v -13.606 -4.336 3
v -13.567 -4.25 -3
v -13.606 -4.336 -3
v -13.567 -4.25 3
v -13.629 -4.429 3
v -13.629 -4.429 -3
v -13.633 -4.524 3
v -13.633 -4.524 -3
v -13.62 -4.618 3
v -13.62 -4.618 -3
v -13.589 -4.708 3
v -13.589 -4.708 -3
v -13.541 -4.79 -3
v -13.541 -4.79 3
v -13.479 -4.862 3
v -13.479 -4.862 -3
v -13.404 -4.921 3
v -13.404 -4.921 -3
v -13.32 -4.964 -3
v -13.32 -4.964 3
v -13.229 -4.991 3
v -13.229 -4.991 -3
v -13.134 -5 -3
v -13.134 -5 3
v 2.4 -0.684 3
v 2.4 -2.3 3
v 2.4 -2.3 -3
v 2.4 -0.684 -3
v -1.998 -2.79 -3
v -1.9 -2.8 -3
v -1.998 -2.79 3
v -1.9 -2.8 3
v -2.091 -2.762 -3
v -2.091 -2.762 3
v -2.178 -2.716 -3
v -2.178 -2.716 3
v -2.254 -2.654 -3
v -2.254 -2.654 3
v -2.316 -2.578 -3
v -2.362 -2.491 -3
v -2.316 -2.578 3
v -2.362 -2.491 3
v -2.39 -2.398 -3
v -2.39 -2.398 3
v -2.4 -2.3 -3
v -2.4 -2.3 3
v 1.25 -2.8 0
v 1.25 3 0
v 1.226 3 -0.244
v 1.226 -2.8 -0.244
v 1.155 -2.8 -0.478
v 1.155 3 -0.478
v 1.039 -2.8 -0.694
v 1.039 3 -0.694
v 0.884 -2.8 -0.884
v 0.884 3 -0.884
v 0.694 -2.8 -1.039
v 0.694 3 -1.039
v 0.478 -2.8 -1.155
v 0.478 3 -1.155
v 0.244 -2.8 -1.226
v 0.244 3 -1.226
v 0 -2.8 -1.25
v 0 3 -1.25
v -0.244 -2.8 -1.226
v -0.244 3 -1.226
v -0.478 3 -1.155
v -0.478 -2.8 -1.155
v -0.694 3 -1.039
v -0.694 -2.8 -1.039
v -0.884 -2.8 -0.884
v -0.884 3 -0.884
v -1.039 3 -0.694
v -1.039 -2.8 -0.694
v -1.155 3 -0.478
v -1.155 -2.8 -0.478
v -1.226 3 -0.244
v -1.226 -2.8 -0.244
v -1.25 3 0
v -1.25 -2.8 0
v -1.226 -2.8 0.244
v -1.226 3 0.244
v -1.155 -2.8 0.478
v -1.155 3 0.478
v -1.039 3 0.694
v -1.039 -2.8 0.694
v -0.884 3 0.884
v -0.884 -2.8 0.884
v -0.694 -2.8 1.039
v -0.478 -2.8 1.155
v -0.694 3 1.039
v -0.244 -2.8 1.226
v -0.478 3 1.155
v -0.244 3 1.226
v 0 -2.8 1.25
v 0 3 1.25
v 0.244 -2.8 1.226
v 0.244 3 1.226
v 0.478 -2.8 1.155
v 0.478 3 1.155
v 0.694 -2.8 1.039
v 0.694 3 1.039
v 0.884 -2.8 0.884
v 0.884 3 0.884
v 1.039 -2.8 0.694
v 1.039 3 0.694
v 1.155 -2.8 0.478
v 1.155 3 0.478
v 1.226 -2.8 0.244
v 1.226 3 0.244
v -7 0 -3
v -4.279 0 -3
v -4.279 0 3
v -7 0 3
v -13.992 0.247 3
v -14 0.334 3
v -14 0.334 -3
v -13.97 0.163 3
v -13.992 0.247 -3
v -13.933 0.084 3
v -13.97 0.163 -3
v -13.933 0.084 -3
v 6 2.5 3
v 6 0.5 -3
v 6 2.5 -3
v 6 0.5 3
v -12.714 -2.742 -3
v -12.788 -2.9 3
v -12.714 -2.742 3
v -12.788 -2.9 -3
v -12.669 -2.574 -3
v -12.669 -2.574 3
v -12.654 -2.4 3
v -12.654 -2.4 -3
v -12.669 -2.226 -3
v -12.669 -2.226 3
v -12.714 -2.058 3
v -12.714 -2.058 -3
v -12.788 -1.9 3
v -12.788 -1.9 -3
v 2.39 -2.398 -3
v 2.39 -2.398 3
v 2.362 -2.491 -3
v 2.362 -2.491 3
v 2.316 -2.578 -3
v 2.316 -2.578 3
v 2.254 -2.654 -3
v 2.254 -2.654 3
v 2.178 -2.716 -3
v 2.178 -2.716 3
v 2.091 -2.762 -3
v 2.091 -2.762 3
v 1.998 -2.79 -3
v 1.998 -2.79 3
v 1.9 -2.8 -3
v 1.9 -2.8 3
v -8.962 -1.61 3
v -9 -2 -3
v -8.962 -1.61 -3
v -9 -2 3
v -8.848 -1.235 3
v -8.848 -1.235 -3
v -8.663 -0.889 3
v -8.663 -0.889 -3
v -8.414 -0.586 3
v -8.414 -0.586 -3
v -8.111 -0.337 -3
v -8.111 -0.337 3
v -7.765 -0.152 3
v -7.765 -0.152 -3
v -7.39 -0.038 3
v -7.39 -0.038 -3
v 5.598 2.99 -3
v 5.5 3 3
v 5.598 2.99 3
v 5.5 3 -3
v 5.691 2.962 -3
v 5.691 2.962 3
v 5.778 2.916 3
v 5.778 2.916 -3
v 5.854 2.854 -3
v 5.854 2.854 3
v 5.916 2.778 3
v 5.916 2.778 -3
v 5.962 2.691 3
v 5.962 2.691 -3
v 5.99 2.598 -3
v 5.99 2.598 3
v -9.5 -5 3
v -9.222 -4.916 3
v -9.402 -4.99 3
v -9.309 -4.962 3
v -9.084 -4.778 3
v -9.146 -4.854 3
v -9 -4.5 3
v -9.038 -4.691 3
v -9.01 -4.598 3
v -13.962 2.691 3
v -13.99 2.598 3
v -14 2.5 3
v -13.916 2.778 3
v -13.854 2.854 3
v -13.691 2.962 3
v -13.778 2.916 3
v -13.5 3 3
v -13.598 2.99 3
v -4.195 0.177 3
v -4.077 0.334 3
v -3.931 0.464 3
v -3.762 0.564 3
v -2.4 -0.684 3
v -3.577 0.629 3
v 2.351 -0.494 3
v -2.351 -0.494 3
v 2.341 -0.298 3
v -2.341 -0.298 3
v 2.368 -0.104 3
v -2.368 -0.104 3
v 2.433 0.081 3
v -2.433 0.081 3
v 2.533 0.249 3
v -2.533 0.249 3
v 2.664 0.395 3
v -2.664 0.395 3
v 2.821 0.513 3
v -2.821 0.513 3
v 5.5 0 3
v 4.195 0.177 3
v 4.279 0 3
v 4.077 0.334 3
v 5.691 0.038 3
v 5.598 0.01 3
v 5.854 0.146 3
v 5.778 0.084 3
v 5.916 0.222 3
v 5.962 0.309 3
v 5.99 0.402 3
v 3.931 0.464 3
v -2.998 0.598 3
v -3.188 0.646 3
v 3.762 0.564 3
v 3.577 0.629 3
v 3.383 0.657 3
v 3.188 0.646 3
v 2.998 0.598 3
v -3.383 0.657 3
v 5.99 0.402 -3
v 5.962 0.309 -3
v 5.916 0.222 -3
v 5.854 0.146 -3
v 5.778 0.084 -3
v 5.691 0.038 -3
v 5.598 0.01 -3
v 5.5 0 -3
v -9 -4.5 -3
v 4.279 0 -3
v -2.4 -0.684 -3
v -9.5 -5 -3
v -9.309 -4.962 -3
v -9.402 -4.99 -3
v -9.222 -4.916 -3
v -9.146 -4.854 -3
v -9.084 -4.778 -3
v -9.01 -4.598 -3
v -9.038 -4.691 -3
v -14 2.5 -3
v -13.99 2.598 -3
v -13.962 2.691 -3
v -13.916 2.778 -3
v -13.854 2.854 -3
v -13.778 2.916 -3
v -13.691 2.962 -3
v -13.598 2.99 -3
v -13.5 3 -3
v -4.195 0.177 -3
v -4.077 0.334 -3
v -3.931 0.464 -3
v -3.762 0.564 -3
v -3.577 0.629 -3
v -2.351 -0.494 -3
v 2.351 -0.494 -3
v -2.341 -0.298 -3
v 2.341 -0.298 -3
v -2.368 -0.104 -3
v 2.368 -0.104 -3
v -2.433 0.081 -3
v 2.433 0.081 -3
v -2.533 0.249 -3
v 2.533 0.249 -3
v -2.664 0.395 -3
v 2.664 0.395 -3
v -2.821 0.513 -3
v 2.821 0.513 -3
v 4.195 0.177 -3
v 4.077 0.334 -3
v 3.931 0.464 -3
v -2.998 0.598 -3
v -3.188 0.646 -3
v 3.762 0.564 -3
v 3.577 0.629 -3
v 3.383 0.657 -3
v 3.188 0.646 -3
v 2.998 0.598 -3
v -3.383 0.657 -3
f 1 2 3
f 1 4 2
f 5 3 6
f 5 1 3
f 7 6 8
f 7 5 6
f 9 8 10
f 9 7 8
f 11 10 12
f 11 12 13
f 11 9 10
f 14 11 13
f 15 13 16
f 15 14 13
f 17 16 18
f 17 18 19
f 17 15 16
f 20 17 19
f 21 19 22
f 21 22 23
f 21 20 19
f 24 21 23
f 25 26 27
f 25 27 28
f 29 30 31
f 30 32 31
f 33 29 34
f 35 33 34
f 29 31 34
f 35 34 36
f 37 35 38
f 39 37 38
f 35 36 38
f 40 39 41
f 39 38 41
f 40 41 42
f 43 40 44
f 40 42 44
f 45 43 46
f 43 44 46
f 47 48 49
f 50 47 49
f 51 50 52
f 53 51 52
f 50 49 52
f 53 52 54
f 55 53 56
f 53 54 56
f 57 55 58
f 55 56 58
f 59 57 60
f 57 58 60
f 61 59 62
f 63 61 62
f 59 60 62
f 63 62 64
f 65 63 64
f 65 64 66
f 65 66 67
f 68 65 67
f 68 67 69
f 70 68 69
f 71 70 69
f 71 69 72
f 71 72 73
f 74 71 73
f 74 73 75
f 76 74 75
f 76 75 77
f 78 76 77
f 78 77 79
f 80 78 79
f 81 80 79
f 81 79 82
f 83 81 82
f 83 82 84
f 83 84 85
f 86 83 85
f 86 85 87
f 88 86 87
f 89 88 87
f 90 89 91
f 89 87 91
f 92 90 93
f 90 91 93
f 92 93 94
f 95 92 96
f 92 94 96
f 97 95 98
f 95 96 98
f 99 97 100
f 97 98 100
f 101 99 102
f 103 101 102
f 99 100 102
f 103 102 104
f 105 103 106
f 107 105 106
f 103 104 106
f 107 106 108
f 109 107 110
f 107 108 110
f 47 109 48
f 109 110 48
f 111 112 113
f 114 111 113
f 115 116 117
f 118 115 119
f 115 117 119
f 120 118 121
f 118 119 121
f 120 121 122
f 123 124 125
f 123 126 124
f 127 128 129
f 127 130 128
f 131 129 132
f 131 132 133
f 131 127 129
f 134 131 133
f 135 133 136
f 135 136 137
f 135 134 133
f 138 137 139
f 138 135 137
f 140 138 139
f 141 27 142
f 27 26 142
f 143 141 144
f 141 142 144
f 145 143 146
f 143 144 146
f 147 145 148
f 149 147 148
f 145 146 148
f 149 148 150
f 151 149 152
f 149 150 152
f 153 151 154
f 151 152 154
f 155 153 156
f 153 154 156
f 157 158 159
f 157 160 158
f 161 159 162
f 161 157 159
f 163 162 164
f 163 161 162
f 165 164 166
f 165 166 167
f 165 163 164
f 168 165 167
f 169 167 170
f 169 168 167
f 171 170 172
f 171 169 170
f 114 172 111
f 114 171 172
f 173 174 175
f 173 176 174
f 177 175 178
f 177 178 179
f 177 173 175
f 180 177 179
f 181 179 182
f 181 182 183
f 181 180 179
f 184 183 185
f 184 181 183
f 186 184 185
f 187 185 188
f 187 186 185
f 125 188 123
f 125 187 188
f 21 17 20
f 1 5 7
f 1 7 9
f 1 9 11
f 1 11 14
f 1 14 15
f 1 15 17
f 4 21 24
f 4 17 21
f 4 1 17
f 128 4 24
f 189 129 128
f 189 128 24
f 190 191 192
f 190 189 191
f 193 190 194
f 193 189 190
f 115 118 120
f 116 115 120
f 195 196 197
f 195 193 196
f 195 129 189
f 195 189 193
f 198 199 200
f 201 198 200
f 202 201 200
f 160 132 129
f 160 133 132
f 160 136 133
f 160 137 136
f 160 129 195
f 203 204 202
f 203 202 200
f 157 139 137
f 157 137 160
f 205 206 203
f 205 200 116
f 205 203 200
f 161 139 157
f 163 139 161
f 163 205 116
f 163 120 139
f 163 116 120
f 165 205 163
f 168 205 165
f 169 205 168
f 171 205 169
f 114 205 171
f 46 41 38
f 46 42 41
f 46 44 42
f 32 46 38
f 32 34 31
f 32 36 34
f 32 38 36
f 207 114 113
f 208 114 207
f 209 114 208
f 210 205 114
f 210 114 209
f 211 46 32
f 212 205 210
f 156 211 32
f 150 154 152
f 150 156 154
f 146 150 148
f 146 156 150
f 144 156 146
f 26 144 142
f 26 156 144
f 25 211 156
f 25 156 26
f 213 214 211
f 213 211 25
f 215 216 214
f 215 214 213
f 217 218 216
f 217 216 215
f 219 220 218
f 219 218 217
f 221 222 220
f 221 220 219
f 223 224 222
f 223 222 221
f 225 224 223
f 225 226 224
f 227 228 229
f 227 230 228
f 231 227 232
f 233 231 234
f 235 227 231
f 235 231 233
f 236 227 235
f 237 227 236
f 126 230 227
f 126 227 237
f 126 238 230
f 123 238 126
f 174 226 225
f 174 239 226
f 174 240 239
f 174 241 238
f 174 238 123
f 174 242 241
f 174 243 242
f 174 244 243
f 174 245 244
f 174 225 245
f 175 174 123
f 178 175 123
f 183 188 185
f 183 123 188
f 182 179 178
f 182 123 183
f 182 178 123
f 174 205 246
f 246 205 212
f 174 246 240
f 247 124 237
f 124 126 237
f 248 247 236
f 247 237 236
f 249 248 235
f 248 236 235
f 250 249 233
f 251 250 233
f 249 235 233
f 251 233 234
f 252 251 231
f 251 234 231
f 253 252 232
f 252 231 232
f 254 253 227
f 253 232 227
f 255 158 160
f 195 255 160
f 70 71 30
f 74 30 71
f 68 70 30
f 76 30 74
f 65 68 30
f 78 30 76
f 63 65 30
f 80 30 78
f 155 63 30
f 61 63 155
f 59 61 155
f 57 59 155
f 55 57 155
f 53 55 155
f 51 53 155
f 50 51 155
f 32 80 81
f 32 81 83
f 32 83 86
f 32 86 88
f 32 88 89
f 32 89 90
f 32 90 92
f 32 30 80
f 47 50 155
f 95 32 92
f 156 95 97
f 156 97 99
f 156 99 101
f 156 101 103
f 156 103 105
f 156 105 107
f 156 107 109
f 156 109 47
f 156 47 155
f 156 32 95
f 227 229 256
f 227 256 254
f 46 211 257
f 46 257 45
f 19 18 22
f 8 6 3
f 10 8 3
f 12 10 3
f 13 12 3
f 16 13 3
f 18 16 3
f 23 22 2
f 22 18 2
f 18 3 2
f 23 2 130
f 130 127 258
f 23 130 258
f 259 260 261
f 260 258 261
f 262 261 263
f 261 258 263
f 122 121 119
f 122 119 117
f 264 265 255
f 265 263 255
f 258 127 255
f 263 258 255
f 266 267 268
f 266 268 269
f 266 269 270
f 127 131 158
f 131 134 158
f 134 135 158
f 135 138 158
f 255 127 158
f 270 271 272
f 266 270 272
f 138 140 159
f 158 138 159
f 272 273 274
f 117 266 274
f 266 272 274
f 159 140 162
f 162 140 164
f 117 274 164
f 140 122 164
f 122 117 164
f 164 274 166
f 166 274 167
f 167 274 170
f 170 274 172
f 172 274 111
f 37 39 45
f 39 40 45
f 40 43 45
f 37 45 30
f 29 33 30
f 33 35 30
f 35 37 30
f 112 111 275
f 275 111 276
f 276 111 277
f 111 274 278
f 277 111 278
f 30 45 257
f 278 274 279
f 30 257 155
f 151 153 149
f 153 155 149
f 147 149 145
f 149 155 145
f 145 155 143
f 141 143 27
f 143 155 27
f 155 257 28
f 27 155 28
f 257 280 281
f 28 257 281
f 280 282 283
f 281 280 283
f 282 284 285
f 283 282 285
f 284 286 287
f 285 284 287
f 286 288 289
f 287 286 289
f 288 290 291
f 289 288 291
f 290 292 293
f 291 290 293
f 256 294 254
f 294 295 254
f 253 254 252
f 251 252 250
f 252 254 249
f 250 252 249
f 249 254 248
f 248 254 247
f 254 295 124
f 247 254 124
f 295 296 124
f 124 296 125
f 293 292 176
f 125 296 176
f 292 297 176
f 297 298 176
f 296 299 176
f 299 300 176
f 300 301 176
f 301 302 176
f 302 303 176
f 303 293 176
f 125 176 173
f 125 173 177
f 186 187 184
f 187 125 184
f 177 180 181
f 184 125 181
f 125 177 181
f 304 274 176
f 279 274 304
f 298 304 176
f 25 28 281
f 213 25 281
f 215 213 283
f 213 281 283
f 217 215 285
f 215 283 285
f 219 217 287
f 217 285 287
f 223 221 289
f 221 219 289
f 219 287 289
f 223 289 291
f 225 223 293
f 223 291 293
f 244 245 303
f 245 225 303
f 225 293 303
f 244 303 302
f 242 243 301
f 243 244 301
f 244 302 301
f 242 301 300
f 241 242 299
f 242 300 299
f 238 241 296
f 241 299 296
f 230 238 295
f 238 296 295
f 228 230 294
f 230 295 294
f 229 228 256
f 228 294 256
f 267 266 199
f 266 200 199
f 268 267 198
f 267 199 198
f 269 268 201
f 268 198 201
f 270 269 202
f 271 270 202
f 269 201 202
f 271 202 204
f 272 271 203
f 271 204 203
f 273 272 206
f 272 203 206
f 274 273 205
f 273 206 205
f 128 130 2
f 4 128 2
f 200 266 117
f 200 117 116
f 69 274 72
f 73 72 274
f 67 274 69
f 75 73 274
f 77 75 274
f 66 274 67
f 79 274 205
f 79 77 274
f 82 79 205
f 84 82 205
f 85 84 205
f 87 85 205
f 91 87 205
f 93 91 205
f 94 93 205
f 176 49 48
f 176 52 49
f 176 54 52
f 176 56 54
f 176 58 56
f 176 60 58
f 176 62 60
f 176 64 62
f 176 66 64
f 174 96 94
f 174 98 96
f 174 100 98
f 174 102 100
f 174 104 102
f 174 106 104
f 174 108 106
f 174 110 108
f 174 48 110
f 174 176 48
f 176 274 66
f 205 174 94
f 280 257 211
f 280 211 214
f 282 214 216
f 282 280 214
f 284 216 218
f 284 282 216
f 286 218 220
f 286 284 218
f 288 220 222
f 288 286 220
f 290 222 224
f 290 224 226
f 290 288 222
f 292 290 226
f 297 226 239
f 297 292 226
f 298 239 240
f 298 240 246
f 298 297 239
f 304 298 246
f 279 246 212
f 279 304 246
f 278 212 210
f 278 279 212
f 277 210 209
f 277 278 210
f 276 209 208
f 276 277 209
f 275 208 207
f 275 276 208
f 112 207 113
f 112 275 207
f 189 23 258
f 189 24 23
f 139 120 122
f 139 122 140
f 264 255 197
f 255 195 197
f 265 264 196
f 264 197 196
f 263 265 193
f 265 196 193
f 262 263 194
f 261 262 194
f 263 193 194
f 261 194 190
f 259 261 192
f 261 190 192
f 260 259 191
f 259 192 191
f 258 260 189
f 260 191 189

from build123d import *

# Parameters (mm, degrees)
BOSS_EXTRU_1_DEPTH      = 3
ESQUISSE2_R             = 1.25
ENL_V_MAT_EXTRU_1_DEPTH = 6.8
ESQUISSE3_W             = 6
ESQUISSE3_H             = 3
BOSS_EXTRU_2_DEPTH      = 8
ESQUISSE6_W             = 5
ESQUISSE6_H             = 6
BOSS_EXTRU_4_DEPTH      = 5
ENL_V_MAT_EXTRU_3_DEPTH = 7
CONG_2_R                = 0.5
CONG_3_R                = 2
CONG_4_R                = 1
ENL_V_MAT_EXTRU_4_DEPTH = 7


with BuildPart() as part:
    # Esquisse1 → Boss.-Extru.1 (new body, symmetric)
    with BuildSketch(Plane.XY):
        Polygon((-6, 0), (-2.4, 0), (-2.4, -2.8), (2.4, -2.8), (2.4, 0), (6, 0), (6, 3), (-6, 3), align=None)
    extrude(amount=BOSS_EXTRU_1_DEPTH, both=True)

    # Esquisse2 → Enlèv. mat.-Extru.1 (cut, through all)
    with BuildSketch(Plane(origin=(0, 3, 0), x_dir=(1, 0, 0), z_dir=(0, 1, 0))):
        Circle(ESQUISSE2_R)
    extrude(amount=-ENL_V_MAT_EXTRU_1_DEPTH, mode=Mode.SUBTRACT)

    # Esquisse3 → Boss.-Extru.2 (add)
    with BuildSketch(Plane.ZY.offset(6)):
        with Locations((0, 1.5)):
            Rectangle(ESQUISSE3_W, ESQUISSE3_H)
    extrude(amount=BOSS_EXTRU_2_DEPTH)

    # Esquisse6 → Boss.-Extru.4 (add)
    with BuildSketch(Plane.XZ):
        with Locations((-11.5, 0)):
            Rectangle(ESQUISSE6_W, ESQUISSE6_H)
    extrude(amount=BOSS_EXTRU_4_DEPTH)

    # Esquisse7 → Enlèv. mat.-Extru.3 (cut, through all)
    with BuildSketch(Plane.XY.offset(3)):
        Polygon((-14, 0.2), (-12.4988893, -2.4), (-14, -5), align=None)
    extrude(amount=-ENL_V_MAT_EXTRU_3_DEPTH, mode=Mode.SUBTRACT)

    # Congé2
    cong_2_edges = [part.edges().sort_by_distance(p)[0] for p in [
        (6, 0, 0),
        (2.4, -2.8, 0),
        (-2.4, -2.8, 0),
        (6, 3, 0),
        (-14, 3, 0),
        (-14, -5, 0),
        (-9, -5, 0),
        (-14, 0.2, 0),
    ]]
    fillet(cong_2_edges, radius=CONG_2_R)

    # Congé3
    cong_3_edges = [part.edges().sort_by_distance(p)[0] for p in [
        (-9, 0, 0),
    ]]
    fillet(cong_3_edges, radius=CONG_3_R)

    # Congé4
    cong_4_edges = [part.edges().sort_by_distance(p)[0] for p in [
        (-12.4988893, -2.4, 0),
    ]]
    fillet(cong_4_edges, radius=CONG_4_R)

    # Esquisse9 → Enlèv. mat.-Extru.4 (cut, through all)
    with BuildSketch(Plane(origin=(0, 0, -3), x_dir=(-1, 0, 0), z_dir=(0, 0, -1))):
        with BuildLine():
            Line((-4.279385242, 0), (-2.4, -0.684040287))
            ThreePointArc((-2.4, -0.684040287), (-2.997672477, 0.597672477), (-4.279385242, 0))
        make_face()
        with BuildLine():
            Line((4.279385242, 0), (2.4, -0.684040287))
            ThreePointArc((2.4, -0.684040287), (2.997672477, 0.597672477), (4.279385242, 0))
        make_face()
    extrude(amount=-ENL_V_MAT_EXTRU_4_DEPTH, mode=Mode.SUBTRACT)


solid = part.part
